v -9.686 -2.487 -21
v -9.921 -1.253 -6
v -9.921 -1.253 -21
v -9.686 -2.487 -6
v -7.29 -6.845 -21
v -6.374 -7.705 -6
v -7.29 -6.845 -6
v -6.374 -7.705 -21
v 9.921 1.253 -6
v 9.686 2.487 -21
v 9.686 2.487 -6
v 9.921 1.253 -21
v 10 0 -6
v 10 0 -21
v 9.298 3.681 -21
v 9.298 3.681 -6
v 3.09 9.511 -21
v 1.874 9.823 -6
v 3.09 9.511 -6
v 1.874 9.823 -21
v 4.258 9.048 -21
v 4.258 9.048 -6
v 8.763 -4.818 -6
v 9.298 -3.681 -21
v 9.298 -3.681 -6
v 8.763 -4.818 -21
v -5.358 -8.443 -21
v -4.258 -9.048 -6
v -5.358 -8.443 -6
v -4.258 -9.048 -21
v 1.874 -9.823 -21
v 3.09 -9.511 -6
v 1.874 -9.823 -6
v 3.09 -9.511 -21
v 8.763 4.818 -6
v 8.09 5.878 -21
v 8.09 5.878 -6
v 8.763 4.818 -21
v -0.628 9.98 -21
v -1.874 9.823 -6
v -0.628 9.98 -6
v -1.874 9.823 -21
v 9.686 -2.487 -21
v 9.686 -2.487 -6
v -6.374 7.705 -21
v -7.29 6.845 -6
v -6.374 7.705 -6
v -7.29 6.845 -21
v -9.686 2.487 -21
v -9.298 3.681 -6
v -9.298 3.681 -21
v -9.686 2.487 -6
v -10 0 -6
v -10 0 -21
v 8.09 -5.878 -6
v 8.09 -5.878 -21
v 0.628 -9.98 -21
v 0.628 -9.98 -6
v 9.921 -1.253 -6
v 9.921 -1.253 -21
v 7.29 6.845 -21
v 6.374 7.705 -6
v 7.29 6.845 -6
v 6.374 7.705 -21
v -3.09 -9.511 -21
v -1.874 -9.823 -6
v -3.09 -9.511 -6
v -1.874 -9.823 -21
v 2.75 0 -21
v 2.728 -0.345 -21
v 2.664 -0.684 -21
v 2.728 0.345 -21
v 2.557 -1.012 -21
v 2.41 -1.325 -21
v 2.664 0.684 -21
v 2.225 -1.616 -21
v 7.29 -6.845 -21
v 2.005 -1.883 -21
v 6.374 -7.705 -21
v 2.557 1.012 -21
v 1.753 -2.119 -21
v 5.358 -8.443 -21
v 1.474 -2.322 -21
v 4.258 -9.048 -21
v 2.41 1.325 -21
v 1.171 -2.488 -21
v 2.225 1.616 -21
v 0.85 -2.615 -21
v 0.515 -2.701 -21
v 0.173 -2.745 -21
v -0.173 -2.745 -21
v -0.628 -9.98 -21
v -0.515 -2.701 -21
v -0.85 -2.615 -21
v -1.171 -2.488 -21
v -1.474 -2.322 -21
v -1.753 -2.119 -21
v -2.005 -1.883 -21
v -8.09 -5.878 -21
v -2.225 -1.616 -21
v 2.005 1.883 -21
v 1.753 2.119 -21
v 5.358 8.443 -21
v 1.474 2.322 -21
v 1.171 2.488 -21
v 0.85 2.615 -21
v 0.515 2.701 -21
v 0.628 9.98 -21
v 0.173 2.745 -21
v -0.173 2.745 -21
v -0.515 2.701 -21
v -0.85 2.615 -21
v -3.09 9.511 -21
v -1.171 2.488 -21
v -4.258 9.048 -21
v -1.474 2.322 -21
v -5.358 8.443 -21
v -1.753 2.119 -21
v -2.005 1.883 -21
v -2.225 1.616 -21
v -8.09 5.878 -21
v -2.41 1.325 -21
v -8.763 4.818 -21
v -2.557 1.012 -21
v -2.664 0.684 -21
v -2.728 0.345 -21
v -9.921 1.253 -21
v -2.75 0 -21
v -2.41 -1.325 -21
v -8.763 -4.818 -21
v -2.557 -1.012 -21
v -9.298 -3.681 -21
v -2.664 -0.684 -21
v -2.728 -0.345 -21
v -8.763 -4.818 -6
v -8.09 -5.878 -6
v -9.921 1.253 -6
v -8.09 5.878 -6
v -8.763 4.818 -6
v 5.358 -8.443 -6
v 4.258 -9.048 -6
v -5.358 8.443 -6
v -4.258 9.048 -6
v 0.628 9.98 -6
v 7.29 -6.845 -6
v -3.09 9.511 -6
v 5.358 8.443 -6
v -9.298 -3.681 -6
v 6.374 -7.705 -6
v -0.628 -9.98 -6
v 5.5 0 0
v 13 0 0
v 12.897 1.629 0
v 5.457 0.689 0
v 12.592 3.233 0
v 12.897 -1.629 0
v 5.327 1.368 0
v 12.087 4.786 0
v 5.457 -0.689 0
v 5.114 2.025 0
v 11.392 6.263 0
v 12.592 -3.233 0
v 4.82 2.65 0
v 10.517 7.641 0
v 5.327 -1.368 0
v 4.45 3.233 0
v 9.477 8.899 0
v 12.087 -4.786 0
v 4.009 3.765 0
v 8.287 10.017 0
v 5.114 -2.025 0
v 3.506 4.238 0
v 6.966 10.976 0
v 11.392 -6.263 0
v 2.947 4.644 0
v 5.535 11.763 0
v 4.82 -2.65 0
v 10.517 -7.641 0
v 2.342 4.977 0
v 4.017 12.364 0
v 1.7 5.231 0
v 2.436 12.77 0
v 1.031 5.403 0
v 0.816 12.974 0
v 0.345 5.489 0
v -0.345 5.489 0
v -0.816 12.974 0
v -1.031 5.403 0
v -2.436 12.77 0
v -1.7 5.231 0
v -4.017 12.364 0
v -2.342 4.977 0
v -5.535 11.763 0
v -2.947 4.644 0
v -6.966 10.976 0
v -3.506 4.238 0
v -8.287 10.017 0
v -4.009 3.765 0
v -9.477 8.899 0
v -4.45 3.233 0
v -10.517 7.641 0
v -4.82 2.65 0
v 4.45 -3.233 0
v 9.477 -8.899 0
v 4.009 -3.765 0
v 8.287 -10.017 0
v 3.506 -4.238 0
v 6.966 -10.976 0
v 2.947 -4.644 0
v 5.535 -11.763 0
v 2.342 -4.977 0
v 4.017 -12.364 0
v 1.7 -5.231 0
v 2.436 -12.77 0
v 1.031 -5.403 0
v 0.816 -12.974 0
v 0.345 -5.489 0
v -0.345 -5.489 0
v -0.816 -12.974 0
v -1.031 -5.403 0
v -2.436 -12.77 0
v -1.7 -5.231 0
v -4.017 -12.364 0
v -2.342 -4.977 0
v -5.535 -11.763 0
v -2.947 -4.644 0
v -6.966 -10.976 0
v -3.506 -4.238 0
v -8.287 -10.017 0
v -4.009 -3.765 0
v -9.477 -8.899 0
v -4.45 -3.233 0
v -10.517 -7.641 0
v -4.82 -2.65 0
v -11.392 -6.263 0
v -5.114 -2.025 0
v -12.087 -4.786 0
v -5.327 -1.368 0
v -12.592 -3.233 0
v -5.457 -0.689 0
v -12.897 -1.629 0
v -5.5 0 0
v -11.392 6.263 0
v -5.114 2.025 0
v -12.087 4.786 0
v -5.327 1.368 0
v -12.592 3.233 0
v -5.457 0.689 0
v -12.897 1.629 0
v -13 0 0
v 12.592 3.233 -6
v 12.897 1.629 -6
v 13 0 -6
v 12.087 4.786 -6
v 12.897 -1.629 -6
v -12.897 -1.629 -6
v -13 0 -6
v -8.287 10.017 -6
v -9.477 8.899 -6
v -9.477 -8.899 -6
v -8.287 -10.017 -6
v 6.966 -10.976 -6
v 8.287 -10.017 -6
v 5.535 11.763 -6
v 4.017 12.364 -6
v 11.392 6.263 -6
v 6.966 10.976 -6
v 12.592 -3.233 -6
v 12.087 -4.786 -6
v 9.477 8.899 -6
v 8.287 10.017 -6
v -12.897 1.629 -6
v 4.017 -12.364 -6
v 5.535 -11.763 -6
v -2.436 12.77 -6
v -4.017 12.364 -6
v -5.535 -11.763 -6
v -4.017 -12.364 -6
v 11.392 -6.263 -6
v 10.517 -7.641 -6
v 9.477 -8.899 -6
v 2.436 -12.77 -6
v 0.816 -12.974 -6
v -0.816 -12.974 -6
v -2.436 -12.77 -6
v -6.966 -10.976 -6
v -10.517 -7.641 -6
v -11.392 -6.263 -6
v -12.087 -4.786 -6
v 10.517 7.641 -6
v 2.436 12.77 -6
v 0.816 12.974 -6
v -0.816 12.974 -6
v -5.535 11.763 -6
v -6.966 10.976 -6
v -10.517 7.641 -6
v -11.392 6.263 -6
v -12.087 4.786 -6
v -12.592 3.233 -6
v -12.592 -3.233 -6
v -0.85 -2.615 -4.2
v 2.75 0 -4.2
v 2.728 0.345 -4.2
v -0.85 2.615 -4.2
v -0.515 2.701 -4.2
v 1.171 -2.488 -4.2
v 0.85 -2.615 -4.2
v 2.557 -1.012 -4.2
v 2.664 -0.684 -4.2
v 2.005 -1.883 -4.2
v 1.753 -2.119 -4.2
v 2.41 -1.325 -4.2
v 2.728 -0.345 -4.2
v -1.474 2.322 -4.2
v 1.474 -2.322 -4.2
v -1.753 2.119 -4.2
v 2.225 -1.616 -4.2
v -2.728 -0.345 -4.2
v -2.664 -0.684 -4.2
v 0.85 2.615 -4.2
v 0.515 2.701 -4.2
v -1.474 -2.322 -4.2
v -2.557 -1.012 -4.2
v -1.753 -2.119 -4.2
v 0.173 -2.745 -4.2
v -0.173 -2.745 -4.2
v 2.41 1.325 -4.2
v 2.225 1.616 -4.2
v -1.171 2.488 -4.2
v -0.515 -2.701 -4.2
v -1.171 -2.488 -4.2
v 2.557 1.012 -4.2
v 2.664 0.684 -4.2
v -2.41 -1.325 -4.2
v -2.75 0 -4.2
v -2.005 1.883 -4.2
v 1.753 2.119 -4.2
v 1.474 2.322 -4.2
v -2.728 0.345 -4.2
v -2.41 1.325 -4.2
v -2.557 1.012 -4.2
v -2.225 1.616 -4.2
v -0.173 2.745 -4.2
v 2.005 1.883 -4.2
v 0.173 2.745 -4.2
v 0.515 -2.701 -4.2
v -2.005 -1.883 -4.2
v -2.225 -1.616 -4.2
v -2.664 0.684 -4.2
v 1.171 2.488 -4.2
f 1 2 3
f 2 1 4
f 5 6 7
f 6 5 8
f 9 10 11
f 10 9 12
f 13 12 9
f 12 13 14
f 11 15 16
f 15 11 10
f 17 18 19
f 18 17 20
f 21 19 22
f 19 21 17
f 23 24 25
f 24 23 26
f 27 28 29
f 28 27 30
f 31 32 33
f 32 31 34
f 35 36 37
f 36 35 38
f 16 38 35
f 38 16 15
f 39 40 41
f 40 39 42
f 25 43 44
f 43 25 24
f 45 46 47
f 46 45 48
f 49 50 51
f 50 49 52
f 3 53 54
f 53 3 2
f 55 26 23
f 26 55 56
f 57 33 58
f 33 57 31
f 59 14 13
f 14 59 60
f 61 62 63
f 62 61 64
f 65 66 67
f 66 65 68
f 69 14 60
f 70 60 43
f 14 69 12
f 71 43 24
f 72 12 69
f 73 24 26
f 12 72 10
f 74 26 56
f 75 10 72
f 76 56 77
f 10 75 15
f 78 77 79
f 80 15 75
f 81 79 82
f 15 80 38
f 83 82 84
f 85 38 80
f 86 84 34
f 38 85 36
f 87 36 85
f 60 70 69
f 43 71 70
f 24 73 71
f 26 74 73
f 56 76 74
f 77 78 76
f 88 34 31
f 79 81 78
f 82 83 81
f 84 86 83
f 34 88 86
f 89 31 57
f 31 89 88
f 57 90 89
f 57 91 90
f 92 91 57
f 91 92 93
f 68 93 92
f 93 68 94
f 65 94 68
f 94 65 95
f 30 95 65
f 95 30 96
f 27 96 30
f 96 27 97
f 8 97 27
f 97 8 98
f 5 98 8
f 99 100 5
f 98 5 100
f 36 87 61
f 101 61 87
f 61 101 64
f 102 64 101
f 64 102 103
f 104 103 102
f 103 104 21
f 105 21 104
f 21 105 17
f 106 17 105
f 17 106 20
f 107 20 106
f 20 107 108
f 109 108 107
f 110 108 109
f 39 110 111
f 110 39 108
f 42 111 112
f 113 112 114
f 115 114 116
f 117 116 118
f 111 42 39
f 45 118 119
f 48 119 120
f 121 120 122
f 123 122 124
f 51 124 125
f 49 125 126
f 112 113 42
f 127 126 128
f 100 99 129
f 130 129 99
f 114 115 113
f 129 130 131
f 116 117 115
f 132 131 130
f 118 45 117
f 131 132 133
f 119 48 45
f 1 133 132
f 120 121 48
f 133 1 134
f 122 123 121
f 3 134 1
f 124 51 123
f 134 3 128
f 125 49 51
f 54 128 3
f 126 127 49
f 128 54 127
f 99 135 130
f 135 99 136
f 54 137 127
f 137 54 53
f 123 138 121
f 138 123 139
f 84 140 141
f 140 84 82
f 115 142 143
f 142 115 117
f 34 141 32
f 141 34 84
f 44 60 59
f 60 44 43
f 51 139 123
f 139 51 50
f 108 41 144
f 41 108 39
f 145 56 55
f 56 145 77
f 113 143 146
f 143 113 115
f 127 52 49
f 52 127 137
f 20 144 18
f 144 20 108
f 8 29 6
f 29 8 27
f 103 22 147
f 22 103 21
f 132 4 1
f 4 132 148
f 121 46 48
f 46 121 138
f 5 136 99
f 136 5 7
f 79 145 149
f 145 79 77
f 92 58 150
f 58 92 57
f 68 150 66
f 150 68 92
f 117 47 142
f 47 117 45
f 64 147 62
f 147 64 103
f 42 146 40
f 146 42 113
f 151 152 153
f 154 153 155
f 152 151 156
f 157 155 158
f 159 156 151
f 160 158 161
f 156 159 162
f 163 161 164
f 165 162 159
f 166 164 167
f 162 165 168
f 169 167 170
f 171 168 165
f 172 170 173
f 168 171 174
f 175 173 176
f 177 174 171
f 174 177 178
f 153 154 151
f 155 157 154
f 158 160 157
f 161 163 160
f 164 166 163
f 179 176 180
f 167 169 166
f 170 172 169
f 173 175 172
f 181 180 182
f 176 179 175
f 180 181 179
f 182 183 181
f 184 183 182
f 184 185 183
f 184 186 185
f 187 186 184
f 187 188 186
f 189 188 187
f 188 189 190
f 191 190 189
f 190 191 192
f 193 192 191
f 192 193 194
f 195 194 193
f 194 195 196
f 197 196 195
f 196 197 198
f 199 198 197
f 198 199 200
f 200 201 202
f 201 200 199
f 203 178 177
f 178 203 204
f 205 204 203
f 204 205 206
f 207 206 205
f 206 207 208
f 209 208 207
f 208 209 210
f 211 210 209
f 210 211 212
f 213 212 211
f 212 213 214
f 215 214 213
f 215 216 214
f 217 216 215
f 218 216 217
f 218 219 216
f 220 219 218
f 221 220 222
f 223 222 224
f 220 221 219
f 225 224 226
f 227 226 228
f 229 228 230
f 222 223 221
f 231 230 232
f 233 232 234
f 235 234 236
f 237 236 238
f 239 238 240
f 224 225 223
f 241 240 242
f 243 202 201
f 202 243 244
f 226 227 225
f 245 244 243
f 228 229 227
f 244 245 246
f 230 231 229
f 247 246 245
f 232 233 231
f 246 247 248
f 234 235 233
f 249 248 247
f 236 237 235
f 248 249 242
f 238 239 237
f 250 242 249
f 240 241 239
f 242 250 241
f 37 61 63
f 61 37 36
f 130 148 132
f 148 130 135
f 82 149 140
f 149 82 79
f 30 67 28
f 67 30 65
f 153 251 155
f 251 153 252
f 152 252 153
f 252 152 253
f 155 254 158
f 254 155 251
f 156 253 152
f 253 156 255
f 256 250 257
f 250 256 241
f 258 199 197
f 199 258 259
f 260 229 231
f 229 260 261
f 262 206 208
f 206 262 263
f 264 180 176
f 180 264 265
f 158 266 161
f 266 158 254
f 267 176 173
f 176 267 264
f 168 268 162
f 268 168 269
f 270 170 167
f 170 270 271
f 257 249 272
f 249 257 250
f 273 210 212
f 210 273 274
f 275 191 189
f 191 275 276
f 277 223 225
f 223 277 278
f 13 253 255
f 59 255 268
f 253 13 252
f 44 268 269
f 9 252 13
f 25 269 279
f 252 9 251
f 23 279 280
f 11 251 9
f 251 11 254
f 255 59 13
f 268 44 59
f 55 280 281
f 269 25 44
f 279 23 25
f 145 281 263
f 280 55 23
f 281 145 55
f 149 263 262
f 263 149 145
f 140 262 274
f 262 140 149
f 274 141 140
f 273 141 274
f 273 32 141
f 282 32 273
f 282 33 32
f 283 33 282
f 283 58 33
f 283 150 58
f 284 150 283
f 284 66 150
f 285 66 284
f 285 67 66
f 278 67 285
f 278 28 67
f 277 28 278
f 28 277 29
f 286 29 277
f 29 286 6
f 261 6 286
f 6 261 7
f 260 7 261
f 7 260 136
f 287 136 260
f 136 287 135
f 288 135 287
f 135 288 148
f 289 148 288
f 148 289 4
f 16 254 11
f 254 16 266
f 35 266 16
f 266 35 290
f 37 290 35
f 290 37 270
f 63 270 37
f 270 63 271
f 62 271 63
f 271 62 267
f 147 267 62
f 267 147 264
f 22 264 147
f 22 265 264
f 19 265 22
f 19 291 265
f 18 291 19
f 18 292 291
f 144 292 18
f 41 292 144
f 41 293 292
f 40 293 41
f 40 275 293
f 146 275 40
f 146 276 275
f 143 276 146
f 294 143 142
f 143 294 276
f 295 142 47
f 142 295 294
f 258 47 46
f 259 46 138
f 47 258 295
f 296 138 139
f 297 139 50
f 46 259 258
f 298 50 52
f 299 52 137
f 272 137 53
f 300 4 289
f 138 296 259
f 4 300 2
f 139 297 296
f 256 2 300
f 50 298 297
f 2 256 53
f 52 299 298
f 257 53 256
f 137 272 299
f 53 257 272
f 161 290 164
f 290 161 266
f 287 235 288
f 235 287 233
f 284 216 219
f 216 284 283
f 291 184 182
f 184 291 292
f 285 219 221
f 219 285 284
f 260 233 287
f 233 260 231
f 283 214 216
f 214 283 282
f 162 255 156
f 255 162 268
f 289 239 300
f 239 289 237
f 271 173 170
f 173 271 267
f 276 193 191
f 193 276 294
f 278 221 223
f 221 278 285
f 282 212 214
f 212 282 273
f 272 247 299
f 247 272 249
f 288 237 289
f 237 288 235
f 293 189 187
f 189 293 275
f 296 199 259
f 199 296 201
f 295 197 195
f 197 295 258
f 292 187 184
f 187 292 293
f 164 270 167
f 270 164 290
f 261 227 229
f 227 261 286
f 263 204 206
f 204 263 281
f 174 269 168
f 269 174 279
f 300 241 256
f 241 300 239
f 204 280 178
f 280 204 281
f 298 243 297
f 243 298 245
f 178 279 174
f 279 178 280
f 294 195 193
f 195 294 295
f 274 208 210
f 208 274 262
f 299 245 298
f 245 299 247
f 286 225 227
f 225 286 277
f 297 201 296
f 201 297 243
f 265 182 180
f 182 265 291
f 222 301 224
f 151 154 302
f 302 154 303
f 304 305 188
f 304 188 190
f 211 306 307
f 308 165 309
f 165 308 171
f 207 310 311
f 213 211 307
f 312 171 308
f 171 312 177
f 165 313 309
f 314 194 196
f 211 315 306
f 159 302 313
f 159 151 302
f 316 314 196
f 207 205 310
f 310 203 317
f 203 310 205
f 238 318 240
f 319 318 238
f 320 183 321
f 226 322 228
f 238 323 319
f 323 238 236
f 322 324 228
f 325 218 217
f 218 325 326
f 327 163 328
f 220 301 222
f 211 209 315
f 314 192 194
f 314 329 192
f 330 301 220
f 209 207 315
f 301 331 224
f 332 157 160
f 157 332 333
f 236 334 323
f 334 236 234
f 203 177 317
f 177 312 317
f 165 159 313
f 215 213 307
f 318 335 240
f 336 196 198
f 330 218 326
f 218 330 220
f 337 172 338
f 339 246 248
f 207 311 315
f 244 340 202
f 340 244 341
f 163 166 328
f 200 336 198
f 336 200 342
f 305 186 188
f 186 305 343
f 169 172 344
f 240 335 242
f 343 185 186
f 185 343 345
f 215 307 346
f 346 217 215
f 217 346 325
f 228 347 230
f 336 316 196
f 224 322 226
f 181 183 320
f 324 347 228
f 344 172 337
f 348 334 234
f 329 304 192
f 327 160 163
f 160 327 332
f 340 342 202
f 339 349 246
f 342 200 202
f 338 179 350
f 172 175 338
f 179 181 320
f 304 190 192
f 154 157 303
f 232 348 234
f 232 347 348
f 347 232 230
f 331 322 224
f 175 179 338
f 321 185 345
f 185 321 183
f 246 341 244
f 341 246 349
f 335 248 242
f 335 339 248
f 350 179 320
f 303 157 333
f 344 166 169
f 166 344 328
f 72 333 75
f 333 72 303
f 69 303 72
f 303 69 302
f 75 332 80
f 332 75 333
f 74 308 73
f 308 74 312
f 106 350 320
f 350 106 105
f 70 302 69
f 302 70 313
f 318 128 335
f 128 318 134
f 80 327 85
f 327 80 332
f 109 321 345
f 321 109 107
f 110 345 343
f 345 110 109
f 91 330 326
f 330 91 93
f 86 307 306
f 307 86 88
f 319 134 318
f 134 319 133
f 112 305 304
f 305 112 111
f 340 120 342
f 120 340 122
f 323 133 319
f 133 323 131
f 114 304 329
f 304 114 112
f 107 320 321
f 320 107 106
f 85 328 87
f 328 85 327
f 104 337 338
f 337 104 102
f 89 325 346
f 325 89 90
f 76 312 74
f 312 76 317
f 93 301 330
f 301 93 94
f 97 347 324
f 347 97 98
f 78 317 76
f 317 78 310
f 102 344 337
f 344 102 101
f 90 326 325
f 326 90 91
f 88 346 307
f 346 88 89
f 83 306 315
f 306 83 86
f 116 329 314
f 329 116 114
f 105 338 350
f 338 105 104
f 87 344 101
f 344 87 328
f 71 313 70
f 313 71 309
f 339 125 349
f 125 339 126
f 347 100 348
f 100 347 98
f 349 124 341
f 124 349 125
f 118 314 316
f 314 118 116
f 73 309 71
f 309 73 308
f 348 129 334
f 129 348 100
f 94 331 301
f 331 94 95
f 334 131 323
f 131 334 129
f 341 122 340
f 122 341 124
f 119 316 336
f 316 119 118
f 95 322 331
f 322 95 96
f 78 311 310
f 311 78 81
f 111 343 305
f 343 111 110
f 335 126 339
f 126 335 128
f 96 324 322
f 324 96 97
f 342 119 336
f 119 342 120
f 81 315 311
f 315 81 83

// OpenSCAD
$fn = 50;


difference() {
	union() {
		translate(v = [0, 0, -21.0000000000]) {
			cylinder(h = 21, r = 10.0000000000);
		}
		translate(v = [0, 0, -6.0000000000]) {
			cylinder(h = 6, r = 13.0000000000);
		}
	}
	union() {
		translate(v = [0, 0, 0]) {
			rotate(a = [0, 0, 0]) {
				difference() {
					union() {
						#translate(v = [0, 0, -21.0000000000]) {
							cylinder(h = 21, r = 2.2500000000);
						}
						#translate(v = [0, 0, -4.2000000000]) {
							cylinder(h = 4.2000000000, r = 10.0000000000, r1 = 2.7500000000, r2 = 5.5000000000);
						}
						#translate(v = [0, 0, -21.0000000000]) {
							cylinder(h = 21, r = 2.7500000000);
						}
						#translate(v = [0, 0, -21.0000000000]) {
							cylinder(h = 21, r = 2.2500000000);
						}
					}
					union();
				}
			}
		}
	}
}
